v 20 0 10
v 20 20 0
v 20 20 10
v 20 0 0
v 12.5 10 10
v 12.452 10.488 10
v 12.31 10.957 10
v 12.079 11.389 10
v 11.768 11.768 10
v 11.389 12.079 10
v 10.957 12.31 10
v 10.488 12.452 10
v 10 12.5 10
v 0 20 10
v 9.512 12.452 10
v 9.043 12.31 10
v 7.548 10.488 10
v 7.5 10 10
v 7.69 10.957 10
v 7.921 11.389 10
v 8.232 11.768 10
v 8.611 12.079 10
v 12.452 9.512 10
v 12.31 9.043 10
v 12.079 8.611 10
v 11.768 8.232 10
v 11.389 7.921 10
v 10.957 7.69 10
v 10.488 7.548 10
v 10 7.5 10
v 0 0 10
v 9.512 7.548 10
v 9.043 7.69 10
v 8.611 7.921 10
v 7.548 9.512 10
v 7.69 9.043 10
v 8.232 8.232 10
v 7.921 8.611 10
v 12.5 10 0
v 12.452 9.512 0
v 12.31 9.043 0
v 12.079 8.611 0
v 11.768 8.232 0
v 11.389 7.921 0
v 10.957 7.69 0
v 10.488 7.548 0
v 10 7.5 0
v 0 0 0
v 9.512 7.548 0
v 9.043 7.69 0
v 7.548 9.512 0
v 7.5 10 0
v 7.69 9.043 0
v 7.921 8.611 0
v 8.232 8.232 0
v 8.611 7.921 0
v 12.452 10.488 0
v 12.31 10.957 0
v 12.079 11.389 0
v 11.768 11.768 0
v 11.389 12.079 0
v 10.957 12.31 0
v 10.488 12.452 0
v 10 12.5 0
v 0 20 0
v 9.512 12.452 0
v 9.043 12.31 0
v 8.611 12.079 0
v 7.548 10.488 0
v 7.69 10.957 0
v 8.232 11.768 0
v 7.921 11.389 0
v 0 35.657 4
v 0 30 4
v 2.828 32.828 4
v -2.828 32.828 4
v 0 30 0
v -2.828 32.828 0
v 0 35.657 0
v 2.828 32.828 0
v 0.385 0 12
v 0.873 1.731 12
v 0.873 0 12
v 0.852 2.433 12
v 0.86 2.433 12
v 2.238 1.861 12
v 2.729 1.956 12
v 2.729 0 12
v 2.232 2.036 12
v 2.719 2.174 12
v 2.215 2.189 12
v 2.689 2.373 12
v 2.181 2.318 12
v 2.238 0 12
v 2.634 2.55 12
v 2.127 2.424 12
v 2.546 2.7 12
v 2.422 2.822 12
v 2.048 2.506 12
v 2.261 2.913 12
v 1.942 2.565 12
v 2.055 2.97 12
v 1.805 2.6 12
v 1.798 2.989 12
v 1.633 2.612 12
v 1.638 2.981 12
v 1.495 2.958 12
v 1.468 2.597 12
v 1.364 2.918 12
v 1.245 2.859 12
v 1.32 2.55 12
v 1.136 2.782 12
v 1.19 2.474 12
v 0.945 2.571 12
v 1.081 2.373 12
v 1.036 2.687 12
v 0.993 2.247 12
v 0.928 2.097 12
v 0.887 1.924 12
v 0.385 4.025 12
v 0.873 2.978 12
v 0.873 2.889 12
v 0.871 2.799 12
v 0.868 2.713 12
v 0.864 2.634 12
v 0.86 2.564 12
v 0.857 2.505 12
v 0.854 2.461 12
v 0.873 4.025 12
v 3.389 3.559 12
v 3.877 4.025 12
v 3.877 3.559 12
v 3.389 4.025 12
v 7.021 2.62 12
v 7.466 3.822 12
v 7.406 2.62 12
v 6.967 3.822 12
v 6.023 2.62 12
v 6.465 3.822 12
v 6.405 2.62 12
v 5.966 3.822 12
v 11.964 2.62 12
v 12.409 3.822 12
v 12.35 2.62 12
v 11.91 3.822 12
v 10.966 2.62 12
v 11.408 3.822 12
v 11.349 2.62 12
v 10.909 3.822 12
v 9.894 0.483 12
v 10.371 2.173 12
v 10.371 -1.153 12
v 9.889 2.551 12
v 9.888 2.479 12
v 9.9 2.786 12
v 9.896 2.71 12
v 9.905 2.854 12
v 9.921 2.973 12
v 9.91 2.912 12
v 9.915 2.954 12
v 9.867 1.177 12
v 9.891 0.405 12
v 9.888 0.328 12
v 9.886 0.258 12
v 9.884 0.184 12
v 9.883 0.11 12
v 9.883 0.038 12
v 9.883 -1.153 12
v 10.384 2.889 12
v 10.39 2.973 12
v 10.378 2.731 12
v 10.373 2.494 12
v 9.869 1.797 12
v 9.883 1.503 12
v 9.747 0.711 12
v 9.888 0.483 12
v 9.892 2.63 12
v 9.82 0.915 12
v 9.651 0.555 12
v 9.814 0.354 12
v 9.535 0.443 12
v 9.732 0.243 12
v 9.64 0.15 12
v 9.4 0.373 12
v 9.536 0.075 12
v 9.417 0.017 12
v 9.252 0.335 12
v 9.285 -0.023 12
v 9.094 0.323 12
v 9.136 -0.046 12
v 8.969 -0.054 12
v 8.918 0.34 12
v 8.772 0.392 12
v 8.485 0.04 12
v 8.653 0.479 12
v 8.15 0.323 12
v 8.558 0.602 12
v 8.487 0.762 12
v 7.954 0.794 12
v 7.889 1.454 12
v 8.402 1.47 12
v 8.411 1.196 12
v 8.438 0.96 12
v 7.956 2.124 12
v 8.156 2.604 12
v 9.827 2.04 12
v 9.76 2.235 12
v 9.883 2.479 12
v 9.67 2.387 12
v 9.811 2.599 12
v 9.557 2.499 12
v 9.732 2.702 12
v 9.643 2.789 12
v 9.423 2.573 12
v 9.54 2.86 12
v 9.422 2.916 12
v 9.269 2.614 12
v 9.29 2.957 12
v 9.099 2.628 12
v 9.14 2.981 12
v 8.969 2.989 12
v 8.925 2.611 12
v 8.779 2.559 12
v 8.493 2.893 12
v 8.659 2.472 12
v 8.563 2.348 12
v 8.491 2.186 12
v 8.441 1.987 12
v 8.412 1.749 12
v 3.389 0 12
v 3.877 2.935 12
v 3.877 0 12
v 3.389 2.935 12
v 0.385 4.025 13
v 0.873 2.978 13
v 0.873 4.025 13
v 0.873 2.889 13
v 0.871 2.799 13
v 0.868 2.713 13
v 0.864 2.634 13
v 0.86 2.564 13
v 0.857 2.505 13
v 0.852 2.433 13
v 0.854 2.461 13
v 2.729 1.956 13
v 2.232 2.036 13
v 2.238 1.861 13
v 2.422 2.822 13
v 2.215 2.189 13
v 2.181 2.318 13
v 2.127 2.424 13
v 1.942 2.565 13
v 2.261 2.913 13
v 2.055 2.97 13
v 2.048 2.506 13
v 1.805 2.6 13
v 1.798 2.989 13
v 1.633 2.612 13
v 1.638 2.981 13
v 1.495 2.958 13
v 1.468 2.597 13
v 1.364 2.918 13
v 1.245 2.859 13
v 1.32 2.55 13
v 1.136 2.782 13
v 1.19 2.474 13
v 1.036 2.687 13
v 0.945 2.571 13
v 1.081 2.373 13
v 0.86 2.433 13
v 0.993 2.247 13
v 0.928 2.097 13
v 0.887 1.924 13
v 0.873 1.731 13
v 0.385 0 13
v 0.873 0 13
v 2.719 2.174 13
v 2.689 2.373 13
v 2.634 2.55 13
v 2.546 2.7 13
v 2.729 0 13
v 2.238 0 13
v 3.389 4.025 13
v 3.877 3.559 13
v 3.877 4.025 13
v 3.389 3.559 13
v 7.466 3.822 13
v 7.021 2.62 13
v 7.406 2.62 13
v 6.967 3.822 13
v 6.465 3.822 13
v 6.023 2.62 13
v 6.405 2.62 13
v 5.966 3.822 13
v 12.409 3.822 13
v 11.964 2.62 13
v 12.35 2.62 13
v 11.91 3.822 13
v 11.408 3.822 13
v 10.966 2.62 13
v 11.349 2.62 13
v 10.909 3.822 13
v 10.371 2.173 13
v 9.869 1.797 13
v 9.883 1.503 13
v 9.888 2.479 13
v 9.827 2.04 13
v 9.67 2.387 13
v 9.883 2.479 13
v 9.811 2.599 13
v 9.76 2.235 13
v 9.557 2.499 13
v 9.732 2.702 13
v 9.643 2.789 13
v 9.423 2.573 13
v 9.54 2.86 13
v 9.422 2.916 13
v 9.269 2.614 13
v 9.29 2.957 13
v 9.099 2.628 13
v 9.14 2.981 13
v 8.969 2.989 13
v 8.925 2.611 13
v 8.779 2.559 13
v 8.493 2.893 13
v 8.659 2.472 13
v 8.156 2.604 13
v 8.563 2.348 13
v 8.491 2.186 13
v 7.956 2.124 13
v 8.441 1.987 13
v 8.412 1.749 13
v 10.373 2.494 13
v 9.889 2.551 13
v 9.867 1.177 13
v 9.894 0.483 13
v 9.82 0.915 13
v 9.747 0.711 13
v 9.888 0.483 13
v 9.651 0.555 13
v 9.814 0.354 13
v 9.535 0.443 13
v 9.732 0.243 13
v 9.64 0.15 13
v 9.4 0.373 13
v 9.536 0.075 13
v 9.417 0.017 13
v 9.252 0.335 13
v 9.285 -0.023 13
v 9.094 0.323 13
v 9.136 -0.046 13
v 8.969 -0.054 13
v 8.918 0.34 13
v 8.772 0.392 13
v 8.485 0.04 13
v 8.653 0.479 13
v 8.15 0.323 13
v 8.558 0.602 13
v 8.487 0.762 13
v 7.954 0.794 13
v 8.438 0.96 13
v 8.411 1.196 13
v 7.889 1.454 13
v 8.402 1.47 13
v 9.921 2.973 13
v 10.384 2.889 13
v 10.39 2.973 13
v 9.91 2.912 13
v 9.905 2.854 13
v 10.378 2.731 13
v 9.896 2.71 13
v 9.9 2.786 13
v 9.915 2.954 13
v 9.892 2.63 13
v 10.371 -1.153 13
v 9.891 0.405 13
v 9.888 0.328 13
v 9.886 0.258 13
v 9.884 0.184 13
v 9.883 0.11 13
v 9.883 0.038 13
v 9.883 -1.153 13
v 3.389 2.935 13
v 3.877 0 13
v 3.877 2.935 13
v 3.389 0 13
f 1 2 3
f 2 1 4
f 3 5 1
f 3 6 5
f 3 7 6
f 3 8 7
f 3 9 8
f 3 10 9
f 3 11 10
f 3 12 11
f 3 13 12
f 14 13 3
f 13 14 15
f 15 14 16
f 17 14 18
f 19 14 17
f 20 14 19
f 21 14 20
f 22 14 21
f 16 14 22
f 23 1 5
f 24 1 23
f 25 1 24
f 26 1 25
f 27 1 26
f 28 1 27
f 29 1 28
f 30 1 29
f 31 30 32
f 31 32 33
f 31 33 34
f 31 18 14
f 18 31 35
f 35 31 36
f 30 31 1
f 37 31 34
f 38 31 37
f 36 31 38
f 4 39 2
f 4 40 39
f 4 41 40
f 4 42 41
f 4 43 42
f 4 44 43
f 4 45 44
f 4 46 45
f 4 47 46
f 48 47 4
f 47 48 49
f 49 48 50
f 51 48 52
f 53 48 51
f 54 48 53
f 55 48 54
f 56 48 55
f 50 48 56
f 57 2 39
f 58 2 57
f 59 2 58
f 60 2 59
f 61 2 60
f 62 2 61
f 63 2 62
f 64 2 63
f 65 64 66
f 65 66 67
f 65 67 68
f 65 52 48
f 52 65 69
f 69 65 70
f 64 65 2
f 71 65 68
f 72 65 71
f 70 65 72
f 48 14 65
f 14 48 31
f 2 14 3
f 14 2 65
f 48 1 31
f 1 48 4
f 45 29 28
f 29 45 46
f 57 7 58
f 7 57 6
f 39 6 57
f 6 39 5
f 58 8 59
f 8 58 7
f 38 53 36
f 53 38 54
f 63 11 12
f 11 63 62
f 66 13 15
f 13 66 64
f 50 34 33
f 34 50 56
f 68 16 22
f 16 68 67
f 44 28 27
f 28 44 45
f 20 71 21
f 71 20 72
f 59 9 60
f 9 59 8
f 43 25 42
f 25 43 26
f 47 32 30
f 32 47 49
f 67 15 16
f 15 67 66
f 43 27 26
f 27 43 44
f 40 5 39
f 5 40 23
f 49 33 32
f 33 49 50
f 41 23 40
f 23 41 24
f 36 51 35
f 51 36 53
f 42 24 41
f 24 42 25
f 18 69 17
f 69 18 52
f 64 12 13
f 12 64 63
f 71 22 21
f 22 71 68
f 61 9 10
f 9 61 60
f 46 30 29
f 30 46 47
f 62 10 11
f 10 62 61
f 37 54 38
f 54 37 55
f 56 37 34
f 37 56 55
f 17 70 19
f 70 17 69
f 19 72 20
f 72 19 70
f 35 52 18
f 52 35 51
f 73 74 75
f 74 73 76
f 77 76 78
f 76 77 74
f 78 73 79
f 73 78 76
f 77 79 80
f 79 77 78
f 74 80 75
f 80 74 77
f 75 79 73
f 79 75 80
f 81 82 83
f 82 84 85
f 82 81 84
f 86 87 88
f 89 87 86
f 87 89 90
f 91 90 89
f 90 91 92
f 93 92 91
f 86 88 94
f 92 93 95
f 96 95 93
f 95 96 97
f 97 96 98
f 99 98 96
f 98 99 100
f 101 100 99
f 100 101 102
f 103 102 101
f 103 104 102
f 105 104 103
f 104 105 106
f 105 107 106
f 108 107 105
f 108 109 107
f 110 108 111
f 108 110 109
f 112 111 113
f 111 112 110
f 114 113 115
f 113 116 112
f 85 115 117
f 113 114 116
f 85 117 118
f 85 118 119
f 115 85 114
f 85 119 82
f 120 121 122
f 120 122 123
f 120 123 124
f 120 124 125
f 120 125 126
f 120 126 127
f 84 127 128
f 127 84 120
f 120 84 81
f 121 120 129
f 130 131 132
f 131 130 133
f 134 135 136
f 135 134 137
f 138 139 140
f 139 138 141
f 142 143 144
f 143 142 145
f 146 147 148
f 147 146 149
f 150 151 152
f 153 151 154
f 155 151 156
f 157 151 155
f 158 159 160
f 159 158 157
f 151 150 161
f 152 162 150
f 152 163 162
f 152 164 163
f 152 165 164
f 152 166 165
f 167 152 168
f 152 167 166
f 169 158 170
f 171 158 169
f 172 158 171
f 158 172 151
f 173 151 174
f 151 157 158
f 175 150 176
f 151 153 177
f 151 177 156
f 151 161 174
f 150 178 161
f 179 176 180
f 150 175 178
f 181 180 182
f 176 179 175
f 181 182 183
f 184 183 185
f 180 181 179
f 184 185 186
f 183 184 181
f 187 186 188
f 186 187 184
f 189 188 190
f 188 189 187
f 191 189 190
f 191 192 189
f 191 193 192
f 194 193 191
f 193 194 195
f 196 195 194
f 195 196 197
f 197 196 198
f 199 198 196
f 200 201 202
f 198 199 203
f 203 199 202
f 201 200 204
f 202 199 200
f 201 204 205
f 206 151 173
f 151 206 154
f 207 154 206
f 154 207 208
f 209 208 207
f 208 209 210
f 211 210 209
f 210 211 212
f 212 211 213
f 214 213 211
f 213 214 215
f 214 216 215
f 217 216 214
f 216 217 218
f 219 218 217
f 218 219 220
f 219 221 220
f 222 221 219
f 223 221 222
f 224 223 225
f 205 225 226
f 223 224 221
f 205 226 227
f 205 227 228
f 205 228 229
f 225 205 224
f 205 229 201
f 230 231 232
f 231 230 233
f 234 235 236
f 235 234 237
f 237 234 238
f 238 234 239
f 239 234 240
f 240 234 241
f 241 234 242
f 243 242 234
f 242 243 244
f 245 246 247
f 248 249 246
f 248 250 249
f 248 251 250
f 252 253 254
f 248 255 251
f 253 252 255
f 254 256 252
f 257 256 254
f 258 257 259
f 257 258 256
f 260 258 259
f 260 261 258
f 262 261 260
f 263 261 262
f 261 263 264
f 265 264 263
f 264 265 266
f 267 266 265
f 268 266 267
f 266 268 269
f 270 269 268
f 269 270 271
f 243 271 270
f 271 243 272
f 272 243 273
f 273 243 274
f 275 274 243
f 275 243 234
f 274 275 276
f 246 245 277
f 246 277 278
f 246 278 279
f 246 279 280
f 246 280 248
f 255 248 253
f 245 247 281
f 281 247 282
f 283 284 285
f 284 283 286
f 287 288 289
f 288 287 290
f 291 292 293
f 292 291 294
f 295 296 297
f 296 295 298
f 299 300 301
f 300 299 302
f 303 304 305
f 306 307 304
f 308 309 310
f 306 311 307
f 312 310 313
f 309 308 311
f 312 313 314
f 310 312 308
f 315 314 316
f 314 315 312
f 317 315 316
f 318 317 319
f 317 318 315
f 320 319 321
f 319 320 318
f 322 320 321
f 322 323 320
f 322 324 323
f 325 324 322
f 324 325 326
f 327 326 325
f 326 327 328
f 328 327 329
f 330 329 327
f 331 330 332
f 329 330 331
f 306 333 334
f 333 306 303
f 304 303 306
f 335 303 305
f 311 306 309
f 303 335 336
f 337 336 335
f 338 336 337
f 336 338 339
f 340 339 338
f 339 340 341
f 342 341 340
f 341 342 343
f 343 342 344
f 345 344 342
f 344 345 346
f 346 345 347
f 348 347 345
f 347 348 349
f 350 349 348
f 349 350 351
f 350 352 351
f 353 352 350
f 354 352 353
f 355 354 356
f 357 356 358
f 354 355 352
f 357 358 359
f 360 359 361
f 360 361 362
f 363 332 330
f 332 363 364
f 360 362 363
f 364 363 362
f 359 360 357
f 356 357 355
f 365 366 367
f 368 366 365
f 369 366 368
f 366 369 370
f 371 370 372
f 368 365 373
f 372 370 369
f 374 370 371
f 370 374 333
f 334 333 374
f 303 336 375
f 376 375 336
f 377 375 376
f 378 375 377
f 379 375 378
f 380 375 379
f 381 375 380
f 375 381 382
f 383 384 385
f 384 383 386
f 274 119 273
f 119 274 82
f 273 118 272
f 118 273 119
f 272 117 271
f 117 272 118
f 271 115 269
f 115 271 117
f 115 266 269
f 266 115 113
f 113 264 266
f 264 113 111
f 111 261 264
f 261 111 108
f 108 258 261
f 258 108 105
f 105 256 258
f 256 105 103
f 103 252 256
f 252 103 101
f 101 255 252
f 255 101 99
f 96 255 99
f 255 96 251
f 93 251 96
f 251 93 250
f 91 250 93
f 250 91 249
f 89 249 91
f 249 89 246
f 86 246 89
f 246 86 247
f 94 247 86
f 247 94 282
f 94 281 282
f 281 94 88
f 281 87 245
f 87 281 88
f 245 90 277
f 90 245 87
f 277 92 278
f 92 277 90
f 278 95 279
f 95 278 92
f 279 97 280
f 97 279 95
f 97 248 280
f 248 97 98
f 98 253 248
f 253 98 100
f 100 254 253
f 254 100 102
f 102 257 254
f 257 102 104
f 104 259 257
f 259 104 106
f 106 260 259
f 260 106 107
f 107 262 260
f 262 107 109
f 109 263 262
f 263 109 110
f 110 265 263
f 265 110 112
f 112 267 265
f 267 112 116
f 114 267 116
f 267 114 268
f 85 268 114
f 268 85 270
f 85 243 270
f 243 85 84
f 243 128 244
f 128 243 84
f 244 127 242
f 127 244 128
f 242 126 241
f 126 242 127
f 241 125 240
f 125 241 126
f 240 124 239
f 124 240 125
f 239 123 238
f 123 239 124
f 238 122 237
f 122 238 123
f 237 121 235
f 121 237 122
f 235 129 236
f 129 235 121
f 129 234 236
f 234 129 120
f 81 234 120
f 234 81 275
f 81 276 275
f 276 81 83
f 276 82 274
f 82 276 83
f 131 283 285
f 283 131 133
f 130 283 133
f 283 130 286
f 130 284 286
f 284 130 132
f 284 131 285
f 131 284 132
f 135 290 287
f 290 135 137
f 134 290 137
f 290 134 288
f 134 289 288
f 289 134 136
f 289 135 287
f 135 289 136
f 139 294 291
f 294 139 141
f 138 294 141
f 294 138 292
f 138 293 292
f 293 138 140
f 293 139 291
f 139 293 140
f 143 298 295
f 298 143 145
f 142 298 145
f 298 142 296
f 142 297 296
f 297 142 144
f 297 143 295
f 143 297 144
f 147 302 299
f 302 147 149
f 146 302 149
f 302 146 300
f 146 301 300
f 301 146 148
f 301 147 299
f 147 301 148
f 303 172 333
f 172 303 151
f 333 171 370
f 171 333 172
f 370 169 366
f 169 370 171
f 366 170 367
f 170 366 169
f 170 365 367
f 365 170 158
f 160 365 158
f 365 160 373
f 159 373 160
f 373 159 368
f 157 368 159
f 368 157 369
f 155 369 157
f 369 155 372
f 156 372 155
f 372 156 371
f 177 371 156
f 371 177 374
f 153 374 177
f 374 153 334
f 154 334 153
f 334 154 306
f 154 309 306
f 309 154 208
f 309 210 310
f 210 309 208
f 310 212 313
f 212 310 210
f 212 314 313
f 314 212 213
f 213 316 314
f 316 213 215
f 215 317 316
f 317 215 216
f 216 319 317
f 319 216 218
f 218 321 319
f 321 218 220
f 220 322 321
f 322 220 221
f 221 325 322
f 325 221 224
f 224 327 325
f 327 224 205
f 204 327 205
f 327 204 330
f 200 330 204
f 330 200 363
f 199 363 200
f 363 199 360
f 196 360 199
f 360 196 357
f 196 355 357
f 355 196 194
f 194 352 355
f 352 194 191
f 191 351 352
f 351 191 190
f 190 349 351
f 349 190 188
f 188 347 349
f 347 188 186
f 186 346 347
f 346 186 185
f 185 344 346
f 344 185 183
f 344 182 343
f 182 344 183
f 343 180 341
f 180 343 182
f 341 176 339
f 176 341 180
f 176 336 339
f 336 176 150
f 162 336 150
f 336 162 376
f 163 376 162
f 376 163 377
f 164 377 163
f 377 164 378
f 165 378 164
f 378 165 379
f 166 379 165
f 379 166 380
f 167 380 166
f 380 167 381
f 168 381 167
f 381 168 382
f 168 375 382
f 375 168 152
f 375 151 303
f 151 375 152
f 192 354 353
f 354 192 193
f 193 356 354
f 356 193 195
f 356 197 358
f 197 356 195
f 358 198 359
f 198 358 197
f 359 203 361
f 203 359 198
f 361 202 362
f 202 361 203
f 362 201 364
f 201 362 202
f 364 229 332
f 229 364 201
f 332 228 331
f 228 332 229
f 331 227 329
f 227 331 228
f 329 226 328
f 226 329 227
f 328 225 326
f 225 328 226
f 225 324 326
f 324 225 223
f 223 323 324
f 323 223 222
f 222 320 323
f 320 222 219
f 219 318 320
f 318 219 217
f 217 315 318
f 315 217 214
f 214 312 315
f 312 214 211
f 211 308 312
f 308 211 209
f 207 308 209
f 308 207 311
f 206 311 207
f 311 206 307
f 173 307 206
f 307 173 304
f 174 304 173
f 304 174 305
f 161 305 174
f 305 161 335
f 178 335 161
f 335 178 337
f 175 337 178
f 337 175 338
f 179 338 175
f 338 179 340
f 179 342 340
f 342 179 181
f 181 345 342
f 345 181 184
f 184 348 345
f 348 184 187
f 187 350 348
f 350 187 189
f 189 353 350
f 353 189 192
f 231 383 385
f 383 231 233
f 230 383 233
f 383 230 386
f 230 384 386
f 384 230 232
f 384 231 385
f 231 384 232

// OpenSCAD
// Modifier probe: # inside a difference (the hole cutter), % beside, nested markers, * and text.
w = 20;
color("red") difference() {
  cube([w, w, 10]);
  translate([10, 10, -1]) #cylinder(r=2.5, h=12, $fn=32);
}
%translate([30, 0, 0]) cube(5);
translate([0, 30, 0]) rotate([0, 0, 45]) {
  #cube(4);
  *sphere(3);
}
for (i = [0:1]) translate([i * 8, -10, 0]) %cylinder(r=2, h=3, $fn=16);
#translate([0, 0, 12]) linear_extrude(1) text("hi \"q\"", size=4);
x = 7 % 3;
echo(x);
